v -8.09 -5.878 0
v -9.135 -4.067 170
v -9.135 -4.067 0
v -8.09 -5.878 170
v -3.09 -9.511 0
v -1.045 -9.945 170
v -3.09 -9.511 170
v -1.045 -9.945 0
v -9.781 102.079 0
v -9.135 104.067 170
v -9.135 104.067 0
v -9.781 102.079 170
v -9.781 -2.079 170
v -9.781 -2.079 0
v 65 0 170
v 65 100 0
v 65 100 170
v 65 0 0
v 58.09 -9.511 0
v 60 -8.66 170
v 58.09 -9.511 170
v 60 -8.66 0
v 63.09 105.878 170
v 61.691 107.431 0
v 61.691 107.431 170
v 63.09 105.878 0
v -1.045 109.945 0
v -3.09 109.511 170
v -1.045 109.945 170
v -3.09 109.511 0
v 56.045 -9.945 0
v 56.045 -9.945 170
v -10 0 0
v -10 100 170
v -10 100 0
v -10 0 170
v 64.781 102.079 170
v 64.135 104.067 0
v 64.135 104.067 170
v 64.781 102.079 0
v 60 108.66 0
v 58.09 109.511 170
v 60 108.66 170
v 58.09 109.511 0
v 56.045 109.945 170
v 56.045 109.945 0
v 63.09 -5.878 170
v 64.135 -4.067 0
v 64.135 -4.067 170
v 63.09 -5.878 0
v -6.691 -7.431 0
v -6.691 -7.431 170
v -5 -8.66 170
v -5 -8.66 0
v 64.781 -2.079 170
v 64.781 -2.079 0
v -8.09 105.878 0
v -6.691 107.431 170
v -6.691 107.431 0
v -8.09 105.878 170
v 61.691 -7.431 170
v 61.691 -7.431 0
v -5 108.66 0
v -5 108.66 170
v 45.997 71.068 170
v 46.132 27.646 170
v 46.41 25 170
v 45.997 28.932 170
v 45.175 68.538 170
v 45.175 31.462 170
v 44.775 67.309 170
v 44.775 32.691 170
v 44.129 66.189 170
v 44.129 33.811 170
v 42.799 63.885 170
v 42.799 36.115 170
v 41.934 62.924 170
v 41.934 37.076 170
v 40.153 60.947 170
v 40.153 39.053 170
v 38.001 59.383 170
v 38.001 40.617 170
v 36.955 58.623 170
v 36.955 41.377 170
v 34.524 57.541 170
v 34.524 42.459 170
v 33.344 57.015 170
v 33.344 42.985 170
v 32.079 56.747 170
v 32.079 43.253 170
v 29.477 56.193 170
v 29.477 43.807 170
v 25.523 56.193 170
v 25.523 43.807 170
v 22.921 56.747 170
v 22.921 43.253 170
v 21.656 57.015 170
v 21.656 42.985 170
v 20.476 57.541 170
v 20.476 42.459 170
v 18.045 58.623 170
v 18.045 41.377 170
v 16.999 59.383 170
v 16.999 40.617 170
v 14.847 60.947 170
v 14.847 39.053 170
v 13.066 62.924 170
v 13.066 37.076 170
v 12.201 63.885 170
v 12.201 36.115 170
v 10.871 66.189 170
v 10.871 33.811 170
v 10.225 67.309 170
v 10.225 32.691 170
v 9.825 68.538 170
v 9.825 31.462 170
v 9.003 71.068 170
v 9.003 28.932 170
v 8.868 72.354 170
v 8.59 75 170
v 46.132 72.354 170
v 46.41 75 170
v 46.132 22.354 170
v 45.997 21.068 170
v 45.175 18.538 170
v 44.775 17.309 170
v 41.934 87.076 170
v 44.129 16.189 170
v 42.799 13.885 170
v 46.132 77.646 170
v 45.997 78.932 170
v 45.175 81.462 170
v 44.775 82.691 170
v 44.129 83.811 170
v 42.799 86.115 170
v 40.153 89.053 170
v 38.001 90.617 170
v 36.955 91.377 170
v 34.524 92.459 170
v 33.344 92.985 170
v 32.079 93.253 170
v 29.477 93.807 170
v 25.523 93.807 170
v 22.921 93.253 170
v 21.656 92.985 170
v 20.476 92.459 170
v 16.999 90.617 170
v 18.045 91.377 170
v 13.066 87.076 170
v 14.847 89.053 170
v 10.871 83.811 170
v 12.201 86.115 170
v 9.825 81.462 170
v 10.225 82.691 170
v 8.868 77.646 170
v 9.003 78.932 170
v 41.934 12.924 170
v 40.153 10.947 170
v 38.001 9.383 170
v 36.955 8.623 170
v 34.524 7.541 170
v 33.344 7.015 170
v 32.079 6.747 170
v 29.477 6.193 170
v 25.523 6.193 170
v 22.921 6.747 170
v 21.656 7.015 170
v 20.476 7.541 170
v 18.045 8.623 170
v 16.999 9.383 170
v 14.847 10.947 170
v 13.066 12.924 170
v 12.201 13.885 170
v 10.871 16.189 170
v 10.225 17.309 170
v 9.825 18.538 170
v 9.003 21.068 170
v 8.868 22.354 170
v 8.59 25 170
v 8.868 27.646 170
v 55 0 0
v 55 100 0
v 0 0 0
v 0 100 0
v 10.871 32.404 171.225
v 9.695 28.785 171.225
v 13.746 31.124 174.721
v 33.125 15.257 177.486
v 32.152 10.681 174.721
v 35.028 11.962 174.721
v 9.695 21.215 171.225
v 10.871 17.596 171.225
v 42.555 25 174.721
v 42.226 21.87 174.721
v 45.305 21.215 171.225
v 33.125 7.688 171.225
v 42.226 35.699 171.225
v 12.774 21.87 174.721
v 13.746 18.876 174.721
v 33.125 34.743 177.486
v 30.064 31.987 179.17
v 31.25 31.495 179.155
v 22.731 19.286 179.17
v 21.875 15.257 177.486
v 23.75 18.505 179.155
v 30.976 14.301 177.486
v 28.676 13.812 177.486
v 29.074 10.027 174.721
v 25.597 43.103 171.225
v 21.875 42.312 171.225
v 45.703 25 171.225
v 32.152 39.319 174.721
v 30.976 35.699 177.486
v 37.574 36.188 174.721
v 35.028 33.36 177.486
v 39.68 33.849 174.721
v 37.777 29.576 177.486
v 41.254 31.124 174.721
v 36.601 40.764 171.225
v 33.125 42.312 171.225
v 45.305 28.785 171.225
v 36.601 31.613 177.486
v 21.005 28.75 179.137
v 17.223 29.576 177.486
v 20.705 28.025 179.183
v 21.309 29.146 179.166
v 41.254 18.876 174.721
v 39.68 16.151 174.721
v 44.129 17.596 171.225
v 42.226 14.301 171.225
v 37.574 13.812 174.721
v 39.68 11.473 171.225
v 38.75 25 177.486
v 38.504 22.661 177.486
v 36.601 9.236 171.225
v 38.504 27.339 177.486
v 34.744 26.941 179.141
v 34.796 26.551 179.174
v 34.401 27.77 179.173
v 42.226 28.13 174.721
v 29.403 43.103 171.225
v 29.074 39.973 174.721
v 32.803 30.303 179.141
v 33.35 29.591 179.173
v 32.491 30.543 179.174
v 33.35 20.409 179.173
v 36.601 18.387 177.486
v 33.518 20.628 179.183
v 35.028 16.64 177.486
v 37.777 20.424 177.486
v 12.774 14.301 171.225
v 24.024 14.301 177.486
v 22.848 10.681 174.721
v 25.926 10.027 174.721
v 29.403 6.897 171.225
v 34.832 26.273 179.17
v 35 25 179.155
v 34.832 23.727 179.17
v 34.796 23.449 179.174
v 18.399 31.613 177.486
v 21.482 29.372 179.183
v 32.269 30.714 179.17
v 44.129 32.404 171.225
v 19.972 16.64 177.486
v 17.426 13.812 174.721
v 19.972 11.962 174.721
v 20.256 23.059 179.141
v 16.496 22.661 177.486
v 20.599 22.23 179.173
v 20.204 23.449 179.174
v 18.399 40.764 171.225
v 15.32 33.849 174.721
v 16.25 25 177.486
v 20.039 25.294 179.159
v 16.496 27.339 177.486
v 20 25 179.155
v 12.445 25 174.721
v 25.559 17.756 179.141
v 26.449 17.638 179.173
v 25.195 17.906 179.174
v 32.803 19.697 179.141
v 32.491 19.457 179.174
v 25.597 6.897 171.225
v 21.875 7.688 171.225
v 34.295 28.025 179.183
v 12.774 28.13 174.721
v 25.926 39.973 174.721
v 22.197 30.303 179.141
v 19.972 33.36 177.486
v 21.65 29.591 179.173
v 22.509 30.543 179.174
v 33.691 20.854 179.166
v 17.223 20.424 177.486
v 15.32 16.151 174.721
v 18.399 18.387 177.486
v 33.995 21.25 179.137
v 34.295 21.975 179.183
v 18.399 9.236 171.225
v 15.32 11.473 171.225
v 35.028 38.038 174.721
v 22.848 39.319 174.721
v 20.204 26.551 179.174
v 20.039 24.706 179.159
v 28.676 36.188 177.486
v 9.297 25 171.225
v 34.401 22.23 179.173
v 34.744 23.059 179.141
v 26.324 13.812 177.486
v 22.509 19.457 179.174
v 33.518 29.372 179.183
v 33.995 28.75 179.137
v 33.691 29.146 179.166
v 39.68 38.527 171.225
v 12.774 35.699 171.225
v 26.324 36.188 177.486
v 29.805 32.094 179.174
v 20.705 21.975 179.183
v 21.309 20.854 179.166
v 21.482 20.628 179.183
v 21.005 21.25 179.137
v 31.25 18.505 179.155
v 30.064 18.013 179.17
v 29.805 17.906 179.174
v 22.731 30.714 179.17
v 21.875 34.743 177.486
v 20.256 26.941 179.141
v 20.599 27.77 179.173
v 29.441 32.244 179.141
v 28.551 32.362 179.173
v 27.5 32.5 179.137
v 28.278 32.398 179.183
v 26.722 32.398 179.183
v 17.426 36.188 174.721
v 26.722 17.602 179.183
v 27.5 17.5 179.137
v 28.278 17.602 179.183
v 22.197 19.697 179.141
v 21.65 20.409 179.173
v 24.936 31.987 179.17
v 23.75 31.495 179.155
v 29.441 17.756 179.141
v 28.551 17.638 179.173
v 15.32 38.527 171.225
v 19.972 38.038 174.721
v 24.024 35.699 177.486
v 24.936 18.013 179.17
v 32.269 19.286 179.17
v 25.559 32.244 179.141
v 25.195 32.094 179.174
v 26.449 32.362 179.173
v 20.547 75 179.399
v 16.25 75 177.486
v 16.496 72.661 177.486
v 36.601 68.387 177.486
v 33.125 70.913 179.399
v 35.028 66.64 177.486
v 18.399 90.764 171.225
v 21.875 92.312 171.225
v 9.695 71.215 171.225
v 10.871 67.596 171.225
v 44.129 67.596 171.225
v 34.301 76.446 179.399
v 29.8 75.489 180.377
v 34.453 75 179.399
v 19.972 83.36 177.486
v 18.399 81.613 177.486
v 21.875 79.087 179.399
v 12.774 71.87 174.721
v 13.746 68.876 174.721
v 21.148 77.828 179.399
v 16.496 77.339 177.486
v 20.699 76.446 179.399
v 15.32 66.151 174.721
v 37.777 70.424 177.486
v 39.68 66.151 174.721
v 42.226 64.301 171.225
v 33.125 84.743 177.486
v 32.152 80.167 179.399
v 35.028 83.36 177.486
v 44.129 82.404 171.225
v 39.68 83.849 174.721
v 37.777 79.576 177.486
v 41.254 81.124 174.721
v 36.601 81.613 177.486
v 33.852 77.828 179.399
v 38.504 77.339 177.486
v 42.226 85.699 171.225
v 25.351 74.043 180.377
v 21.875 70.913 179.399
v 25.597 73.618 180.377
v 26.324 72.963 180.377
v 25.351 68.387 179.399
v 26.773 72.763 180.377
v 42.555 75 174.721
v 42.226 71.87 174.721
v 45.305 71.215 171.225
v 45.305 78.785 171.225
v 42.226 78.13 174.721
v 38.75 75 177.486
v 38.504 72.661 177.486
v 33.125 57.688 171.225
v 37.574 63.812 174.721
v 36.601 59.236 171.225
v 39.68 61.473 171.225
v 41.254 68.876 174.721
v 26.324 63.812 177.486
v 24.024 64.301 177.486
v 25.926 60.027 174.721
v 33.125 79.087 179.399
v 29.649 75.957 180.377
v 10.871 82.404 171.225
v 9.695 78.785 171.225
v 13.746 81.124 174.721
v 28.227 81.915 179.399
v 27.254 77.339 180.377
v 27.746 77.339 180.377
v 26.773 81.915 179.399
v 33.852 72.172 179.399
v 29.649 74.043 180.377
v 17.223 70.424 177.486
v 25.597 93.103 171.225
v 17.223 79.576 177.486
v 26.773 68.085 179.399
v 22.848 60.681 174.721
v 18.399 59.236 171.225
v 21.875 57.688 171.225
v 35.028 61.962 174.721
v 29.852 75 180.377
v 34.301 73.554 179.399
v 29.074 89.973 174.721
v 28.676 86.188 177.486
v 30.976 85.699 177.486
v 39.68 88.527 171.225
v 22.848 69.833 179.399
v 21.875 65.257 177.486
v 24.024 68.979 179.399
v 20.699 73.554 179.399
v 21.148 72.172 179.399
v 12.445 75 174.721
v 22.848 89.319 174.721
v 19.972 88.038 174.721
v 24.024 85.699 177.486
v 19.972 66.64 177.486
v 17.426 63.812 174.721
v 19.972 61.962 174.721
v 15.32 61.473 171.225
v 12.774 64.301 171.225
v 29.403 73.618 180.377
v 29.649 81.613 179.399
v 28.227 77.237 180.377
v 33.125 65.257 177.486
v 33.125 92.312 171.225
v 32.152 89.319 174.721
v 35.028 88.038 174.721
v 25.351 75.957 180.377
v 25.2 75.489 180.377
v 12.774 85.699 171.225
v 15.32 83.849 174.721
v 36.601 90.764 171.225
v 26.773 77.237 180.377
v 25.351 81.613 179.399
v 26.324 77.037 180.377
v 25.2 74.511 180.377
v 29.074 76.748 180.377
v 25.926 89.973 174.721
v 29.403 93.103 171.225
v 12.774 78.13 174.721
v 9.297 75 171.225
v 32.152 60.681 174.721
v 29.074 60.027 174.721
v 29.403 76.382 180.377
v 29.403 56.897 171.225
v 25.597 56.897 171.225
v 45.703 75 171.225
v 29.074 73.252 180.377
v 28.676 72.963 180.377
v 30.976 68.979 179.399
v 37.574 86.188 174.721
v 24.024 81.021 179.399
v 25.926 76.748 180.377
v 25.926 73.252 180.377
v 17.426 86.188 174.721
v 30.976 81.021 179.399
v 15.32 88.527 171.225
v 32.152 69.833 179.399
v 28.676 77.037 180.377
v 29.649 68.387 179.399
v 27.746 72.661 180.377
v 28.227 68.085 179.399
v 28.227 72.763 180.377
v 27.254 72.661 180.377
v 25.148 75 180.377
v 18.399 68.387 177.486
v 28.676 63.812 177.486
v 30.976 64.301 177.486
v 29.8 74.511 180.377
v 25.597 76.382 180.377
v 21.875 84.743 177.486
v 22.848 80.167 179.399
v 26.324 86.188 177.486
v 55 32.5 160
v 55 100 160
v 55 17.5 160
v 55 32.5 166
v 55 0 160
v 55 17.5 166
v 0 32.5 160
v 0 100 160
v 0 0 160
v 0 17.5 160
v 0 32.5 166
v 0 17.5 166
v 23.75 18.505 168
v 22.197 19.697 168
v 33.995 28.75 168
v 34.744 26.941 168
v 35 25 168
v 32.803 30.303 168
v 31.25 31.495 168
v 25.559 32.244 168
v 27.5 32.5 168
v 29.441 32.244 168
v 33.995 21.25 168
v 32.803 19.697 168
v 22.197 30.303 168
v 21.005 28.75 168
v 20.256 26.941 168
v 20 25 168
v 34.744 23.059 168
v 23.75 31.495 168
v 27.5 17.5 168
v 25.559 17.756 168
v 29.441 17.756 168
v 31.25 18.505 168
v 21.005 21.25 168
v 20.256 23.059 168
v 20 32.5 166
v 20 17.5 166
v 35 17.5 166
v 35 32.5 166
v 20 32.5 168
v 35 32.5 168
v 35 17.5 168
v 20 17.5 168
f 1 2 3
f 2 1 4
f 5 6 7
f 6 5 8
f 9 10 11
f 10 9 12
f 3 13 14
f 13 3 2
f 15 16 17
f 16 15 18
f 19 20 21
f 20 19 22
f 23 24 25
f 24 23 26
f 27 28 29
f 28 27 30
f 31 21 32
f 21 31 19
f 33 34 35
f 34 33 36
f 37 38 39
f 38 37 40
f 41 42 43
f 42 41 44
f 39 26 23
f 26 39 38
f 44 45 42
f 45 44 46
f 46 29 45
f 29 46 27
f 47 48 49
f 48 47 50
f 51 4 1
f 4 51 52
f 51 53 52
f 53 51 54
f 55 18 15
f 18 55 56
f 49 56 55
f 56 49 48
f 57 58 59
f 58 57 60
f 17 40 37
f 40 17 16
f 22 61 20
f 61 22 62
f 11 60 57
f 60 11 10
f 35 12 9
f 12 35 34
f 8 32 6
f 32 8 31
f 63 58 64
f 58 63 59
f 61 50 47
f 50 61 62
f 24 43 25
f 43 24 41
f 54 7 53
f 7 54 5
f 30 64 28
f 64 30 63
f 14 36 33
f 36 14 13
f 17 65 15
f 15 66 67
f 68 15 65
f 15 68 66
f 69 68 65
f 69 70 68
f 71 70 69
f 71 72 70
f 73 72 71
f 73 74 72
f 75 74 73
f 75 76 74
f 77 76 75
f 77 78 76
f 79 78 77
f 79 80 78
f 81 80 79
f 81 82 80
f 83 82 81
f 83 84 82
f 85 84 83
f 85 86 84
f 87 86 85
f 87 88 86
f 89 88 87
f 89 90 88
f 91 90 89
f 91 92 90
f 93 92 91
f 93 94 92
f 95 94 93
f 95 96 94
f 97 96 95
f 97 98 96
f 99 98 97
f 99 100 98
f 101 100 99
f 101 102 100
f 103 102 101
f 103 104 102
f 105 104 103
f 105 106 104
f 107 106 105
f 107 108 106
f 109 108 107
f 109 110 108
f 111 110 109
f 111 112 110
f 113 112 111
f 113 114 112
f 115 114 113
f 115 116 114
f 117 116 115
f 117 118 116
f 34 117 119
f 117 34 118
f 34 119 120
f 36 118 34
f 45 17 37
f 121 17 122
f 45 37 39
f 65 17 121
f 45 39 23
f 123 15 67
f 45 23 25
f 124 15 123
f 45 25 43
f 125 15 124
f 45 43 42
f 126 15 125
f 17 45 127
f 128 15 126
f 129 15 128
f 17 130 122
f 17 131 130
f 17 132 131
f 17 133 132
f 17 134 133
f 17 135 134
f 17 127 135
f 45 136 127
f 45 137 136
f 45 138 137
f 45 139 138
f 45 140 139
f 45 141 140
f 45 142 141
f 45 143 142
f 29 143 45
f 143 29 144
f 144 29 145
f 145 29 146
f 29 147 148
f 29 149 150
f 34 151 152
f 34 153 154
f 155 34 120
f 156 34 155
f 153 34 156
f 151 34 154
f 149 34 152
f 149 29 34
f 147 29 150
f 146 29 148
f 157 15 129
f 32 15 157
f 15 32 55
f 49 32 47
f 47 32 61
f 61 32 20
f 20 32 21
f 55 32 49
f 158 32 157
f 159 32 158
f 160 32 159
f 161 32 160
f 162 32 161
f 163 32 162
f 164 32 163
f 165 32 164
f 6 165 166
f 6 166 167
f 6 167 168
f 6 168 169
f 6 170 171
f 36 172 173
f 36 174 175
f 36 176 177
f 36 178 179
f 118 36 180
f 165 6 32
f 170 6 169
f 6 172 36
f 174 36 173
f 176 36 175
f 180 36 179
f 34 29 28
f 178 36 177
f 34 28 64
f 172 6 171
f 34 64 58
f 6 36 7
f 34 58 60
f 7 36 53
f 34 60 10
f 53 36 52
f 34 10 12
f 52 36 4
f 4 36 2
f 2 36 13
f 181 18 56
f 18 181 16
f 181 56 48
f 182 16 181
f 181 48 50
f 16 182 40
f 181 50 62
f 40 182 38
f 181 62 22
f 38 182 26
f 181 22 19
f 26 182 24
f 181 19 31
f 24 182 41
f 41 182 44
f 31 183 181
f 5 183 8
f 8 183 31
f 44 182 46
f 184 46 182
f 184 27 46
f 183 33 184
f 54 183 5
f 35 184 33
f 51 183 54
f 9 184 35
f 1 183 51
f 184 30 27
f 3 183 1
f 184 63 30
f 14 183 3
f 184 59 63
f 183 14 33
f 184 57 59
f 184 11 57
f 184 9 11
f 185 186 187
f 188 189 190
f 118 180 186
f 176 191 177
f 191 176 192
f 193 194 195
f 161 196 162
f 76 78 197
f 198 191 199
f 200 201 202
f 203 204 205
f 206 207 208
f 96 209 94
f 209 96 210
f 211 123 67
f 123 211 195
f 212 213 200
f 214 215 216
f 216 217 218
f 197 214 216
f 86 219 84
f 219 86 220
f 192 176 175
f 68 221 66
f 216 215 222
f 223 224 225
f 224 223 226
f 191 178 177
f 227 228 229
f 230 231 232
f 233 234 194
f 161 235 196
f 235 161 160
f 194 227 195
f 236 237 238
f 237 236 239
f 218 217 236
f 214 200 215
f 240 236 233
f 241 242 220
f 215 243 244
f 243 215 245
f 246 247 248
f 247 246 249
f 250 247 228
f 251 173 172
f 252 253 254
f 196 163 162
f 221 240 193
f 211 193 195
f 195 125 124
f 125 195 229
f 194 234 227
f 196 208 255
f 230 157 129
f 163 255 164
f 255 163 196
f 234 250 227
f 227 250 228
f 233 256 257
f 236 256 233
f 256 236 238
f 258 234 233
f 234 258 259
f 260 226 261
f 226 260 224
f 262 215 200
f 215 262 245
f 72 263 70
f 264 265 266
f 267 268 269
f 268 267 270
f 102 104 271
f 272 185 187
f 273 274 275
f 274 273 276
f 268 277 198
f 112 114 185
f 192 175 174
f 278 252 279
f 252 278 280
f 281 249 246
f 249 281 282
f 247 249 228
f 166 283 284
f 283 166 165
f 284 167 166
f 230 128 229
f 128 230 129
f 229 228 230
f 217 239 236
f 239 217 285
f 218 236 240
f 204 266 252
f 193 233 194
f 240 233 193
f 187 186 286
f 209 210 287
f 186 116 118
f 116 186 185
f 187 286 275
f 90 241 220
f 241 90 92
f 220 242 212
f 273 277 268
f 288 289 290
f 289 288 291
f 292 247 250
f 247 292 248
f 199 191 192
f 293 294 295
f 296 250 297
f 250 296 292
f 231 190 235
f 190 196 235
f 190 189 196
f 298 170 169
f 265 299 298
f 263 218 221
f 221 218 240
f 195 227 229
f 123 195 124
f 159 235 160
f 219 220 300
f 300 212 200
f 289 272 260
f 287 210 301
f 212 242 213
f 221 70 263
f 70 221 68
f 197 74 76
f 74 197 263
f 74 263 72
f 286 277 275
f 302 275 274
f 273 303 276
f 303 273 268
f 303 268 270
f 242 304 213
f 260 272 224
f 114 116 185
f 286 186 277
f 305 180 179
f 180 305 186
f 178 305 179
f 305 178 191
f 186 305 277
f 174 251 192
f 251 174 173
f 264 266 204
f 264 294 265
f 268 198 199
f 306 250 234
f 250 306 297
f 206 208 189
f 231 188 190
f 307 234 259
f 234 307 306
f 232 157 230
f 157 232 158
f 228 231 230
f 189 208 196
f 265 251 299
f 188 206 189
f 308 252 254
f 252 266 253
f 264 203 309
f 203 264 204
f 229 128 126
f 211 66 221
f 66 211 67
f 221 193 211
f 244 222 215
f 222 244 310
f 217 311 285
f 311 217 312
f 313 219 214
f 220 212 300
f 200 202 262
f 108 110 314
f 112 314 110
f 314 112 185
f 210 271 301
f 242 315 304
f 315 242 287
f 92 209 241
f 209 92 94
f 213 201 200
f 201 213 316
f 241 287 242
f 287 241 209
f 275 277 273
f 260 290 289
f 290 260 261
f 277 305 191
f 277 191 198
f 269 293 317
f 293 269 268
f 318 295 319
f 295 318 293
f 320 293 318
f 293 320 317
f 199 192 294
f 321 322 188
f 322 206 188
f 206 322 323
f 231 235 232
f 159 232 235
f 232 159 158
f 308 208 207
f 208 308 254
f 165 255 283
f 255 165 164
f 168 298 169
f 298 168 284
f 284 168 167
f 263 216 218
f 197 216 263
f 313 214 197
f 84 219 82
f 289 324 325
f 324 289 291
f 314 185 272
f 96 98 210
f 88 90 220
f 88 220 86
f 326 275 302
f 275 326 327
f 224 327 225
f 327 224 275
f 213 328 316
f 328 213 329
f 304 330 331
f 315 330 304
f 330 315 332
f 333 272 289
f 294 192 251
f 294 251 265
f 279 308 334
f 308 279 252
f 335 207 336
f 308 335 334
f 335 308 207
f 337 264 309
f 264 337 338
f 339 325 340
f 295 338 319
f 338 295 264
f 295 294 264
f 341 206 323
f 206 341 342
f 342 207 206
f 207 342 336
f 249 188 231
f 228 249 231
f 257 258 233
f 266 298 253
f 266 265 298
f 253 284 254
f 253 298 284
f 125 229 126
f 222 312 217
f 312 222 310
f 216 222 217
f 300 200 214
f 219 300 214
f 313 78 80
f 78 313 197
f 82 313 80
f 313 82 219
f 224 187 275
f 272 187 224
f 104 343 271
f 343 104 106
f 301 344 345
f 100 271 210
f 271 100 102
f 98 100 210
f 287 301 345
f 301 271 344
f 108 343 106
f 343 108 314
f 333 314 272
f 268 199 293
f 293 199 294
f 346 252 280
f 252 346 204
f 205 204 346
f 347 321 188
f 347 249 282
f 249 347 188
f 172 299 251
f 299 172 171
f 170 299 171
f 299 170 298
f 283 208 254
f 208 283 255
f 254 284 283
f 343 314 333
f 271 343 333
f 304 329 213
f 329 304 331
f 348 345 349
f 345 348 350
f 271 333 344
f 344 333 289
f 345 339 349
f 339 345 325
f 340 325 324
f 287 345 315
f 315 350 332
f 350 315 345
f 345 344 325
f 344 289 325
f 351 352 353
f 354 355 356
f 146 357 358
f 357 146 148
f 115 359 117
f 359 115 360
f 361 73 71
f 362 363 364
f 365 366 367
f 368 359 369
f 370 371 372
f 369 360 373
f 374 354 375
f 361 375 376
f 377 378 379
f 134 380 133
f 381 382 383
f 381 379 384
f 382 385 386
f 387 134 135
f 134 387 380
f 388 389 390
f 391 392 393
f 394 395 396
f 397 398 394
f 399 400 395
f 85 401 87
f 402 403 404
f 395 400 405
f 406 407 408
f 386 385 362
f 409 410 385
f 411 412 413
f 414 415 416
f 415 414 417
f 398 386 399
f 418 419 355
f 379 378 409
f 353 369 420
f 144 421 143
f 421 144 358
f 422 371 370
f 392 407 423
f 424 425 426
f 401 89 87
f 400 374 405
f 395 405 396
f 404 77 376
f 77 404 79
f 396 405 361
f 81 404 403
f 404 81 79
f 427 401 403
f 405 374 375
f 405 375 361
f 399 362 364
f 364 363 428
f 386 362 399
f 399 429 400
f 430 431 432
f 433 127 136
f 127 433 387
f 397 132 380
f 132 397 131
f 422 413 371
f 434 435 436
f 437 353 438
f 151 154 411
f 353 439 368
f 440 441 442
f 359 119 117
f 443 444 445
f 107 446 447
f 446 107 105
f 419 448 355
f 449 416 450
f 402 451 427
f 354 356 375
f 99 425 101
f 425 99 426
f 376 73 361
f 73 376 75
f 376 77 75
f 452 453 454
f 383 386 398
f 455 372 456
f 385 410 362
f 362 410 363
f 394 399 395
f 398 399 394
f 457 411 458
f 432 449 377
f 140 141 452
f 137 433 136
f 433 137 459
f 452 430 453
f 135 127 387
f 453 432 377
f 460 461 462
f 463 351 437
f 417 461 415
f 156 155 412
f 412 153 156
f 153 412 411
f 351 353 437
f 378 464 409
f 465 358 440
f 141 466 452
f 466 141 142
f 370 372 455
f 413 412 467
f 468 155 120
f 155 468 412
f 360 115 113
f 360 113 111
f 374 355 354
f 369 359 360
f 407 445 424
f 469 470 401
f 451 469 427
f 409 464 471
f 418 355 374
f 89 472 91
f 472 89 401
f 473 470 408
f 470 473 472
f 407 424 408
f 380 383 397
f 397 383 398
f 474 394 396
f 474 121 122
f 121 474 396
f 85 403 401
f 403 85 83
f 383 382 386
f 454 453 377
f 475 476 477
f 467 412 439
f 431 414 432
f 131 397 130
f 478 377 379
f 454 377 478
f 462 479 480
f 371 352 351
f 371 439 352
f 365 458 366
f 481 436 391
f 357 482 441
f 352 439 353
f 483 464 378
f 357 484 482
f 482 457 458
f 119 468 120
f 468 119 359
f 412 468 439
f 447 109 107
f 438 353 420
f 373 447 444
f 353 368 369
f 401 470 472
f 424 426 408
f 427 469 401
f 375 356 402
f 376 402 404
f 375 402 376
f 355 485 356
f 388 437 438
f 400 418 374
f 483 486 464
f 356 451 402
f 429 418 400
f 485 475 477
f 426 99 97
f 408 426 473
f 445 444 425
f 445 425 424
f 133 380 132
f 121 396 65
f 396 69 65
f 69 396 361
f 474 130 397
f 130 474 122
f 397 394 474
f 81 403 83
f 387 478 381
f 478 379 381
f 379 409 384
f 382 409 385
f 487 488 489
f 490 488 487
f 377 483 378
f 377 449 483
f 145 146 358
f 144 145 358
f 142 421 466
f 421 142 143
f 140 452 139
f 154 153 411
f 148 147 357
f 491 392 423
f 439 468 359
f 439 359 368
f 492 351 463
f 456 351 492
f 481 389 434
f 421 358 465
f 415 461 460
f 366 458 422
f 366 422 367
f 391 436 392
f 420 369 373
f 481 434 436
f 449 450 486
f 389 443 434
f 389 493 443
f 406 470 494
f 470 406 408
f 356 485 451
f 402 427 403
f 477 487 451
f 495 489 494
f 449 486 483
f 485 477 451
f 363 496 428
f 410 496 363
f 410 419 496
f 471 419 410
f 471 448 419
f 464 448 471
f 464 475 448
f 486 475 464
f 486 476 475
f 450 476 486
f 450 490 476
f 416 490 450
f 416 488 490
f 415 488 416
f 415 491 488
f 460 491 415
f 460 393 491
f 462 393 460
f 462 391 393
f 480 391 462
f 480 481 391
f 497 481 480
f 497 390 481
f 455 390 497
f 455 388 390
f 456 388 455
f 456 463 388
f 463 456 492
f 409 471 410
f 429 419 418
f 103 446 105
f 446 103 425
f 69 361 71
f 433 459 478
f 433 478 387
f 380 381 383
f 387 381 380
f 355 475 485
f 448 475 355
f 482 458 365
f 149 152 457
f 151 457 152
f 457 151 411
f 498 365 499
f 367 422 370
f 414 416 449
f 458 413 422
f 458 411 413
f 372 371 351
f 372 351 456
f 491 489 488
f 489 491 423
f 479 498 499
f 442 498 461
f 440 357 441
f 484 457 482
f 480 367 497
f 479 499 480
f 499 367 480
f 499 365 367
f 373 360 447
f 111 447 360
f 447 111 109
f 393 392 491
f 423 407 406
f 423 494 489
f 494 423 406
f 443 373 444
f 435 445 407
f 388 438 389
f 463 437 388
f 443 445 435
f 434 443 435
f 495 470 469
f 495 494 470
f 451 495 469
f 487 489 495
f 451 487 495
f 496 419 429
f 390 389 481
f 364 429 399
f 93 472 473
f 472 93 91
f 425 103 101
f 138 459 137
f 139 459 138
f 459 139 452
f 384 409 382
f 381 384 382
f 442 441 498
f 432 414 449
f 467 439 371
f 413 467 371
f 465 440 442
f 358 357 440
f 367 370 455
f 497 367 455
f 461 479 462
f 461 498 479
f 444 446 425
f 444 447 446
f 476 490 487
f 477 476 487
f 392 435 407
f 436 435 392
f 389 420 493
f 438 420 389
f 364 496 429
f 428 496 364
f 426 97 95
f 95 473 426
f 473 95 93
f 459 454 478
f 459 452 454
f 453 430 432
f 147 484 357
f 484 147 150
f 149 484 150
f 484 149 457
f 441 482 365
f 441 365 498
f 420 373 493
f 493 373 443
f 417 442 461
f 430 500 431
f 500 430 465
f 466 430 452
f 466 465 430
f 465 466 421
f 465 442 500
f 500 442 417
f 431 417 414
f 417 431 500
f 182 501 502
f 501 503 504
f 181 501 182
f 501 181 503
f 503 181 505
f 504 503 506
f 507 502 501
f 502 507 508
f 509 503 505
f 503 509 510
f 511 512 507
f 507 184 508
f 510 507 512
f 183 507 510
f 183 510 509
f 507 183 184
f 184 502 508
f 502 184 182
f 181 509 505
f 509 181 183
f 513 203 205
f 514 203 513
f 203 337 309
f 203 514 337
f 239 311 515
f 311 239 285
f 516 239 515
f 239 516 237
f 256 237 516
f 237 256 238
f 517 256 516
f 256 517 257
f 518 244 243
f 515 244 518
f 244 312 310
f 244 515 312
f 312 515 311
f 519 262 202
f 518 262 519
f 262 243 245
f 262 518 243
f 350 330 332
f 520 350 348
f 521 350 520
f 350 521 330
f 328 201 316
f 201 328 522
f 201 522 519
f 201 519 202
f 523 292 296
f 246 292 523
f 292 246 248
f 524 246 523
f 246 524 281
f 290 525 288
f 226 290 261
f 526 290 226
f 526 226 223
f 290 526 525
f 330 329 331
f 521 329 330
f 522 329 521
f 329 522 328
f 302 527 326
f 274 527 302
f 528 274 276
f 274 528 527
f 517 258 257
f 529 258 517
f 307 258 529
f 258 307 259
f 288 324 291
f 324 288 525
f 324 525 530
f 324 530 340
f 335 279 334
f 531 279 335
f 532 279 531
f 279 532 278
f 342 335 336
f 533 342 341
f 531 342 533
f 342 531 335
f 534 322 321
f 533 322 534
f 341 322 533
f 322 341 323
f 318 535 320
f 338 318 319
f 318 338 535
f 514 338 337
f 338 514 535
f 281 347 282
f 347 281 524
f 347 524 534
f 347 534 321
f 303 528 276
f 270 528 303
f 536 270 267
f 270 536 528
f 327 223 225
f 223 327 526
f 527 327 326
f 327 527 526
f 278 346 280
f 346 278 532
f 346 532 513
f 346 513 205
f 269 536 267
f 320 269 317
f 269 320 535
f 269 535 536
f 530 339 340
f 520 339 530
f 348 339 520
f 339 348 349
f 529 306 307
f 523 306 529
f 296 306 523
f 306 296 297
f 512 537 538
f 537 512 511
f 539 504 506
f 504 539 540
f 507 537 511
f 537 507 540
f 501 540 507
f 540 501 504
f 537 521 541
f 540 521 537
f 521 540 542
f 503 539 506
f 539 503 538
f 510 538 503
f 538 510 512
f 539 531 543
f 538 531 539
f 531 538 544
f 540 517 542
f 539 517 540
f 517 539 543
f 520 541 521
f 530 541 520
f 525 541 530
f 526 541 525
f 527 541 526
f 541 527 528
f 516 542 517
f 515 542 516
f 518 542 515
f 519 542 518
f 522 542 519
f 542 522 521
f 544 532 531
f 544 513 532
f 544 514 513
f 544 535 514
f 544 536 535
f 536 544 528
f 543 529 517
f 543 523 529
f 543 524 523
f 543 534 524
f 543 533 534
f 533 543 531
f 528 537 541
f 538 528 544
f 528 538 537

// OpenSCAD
difference() {
    battery_whole();
    cube([55,100,160]);
    translate([55/2,25]) cylinder(d=15,h=200);
    translate([0,25-7.5]) cube([55,15,166]);
    translate([55/2-7.5,25-7.5]) cube([15,15,168]);
}
translate([56,-20,15]) rotate([90,0,90]) linear_extrude(height=10) scale([1,1,1]) import("ray.dxf");
mirror([0,1,0]) translate([-11,-120,15]) rotate([90,0,90]) linear_extrude(height=10) scale([1,1,1]) import("ray.dxf");

module battery_whole() {
    union() {
        minkowski() {
            cube([55,100,10]);
            cylinder(r=10,h=160);
        }

        translate([55/2,25,158])
            sphere(d=45);
        translate([55/2,100-25,158])
            sphere(d=45);
    }
}
